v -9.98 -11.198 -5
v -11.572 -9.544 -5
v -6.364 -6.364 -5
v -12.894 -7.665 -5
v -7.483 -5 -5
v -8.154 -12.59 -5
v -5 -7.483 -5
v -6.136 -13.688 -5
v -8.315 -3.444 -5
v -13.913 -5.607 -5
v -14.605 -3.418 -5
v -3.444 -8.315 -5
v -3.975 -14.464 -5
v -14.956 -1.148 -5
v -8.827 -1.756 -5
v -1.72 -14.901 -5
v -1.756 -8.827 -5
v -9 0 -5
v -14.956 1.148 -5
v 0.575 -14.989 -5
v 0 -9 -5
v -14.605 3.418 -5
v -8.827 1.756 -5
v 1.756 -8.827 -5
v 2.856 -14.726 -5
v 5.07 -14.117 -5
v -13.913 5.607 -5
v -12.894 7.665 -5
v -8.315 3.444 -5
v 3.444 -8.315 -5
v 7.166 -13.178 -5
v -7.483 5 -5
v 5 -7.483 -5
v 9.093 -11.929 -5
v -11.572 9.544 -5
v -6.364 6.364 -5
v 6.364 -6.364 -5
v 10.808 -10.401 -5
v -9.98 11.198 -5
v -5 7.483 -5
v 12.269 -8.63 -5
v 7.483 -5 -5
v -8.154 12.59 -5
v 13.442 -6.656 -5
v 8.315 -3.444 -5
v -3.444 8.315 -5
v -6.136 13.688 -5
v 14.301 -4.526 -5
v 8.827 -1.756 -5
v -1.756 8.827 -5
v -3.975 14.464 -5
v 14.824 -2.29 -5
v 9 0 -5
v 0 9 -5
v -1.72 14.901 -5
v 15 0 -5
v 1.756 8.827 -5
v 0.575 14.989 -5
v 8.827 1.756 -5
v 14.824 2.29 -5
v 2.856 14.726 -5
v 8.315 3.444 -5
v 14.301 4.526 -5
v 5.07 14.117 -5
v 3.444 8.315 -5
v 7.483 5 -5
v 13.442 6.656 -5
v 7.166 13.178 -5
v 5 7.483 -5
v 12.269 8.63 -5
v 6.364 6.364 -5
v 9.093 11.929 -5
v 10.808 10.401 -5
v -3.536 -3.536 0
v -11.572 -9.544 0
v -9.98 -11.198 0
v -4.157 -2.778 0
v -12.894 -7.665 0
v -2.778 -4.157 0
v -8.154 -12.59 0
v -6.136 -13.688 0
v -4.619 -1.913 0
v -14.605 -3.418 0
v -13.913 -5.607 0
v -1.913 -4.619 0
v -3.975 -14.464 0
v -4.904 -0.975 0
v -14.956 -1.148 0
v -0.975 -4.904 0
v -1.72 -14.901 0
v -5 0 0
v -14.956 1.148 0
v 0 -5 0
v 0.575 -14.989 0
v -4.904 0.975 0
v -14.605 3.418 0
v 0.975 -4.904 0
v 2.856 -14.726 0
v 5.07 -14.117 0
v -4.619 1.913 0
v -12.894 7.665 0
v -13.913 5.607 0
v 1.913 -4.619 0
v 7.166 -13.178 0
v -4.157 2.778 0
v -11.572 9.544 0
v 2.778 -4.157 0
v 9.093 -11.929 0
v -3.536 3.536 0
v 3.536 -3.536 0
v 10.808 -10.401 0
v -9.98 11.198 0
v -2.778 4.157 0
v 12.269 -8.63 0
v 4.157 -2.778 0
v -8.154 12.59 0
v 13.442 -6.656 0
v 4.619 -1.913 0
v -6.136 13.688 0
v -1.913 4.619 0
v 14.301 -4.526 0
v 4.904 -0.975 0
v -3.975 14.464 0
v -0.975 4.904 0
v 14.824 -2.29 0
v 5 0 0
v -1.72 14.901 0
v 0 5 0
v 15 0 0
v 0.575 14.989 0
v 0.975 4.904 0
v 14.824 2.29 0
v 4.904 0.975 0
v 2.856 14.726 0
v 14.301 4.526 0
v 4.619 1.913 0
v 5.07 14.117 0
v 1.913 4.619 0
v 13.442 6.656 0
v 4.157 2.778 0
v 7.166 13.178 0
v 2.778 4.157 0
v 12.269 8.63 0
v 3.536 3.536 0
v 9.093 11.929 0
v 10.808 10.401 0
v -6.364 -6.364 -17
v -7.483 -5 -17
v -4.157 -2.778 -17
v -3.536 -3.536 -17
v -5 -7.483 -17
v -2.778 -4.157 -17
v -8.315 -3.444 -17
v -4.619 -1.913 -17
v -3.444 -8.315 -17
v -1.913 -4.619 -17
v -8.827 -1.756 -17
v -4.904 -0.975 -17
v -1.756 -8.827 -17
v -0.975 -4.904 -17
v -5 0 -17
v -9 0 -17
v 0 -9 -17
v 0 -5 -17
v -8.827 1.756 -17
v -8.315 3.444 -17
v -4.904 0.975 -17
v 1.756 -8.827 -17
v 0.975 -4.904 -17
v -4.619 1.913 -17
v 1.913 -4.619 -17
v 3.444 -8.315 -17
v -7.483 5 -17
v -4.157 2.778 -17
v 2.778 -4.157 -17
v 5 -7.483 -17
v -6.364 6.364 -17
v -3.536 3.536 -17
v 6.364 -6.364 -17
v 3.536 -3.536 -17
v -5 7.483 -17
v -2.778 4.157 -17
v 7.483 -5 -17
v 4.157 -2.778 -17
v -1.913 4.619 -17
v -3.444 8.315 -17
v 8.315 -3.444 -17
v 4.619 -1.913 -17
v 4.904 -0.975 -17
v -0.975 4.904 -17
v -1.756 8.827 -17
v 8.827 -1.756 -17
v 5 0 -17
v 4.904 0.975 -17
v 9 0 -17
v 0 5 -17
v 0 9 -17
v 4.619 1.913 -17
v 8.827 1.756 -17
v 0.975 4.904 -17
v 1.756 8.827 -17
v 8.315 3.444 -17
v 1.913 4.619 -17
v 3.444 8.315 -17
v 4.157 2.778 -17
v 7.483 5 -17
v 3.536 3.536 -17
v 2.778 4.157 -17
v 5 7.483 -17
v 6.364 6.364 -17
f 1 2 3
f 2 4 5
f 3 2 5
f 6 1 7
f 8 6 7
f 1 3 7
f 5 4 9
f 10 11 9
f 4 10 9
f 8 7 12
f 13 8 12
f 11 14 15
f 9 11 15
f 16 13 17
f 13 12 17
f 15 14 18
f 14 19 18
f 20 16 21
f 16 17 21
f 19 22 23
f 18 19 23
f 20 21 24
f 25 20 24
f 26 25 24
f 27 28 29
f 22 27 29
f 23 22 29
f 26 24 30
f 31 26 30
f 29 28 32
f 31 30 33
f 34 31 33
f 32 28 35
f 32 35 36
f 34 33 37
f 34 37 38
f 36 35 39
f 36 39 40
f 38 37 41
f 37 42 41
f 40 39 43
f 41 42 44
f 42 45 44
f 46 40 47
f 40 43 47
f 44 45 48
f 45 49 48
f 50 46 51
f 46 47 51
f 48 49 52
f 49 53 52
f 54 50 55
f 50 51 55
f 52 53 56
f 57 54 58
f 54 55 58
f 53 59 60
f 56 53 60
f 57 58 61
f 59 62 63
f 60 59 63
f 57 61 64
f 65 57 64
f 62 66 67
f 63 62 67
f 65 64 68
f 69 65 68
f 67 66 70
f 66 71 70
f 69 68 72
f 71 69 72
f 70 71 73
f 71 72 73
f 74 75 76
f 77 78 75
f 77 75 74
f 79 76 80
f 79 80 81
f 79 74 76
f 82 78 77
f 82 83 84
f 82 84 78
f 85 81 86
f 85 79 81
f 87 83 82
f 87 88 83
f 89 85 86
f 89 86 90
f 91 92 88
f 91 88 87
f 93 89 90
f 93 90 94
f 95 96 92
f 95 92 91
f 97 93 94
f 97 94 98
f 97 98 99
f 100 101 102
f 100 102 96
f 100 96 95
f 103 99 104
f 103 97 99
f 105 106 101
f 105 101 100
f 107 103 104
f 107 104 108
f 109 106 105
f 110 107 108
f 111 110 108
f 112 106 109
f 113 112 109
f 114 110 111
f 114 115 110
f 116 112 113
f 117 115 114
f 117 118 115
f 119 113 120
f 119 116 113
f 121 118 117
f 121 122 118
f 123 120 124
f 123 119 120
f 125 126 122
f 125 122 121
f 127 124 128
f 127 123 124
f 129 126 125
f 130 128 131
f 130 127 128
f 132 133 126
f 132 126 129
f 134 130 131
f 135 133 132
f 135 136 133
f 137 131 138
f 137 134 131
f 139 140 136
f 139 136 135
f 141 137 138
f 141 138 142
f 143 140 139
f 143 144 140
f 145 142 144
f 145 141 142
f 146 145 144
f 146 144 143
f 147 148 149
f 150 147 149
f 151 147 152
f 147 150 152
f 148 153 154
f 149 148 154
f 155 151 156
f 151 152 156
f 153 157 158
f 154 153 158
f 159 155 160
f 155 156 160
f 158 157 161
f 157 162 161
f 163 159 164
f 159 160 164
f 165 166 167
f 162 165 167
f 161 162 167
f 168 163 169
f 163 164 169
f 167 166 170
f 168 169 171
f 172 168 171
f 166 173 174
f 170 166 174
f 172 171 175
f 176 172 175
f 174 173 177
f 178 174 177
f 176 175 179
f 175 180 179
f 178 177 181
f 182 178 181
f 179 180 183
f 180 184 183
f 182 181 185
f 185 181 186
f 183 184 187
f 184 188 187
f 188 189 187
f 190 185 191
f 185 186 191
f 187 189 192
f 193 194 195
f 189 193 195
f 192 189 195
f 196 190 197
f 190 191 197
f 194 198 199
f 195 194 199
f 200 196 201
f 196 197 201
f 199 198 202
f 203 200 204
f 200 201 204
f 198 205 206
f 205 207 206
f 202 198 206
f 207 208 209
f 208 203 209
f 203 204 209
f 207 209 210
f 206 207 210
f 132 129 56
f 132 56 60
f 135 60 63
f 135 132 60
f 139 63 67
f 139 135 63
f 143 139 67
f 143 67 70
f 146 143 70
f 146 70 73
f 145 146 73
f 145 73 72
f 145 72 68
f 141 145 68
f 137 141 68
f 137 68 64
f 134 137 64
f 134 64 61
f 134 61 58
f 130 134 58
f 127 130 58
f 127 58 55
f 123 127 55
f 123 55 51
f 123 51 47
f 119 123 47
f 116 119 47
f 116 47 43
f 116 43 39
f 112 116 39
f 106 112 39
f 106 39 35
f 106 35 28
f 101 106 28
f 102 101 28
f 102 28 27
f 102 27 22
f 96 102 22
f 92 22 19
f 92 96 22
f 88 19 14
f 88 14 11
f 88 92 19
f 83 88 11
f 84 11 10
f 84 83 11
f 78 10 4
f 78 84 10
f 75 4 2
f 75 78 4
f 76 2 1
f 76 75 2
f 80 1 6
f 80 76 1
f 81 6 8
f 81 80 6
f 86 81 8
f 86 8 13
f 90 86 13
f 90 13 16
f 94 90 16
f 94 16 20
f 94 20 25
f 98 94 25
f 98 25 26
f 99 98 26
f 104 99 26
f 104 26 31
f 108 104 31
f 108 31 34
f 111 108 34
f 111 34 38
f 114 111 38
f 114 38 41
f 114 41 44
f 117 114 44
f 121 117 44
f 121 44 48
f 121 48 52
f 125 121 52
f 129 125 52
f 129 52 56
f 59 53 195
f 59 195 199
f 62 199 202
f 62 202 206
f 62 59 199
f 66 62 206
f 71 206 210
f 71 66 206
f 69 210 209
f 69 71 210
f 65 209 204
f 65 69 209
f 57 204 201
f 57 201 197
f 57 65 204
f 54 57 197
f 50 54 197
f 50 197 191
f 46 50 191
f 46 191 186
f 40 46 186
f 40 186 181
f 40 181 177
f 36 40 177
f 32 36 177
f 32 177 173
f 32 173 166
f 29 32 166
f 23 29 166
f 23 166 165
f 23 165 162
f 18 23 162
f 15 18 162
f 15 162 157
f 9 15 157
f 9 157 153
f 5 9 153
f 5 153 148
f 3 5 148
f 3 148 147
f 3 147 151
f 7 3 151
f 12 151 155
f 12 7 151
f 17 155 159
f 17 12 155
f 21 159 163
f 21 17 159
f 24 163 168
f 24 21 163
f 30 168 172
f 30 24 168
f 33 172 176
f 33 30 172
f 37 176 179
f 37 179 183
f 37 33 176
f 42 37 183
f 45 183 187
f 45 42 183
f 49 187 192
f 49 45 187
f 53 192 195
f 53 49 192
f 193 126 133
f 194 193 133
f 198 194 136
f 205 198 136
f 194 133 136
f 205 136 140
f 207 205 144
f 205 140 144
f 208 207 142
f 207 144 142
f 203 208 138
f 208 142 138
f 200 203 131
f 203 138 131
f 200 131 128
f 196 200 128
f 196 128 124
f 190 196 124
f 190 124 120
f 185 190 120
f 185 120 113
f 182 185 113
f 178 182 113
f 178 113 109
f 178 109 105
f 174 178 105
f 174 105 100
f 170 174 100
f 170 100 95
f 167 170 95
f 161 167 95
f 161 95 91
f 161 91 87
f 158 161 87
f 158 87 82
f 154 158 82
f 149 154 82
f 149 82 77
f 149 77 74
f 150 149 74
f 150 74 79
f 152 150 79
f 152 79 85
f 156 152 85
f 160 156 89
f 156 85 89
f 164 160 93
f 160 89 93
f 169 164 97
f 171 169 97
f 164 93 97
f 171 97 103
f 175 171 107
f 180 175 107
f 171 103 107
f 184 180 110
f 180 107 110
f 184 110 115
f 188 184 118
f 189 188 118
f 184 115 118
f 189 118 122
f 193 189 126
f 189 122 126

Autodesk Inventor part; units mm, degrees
ref_plane "YZ Plane" through (0, 0, 0) normal (1, 0, 0) x (0, 1, 0)
ref_plane "XZ Plane" through (0, 0, 0) normal (0, 1, 0) x (-1, 0, 0)
ref_plane "XY Plane" through (0, 0, 0) normal (0, 0, 1) x (1, 0, 0)
sketch "Sketch2" plane through (0, 0, 0) normal (0, 0, 1) x (1, 0, 0)
  circle A0 centre (0, 0) radius 15
  dimension "d0" = 30
extrude "Extrusion1" add sketch "Sketch2" against normal blind 5
sketch "Sketch3" plane through (0, 0, 0) normal (0, 0, 1) x (1, 0, 0)
  circle A0 centre (0, 0) radius 9
  dimension "d3" = 18
extrude "Extrusion2" add sketch "Sketch3" against normal blind 17
sketch "Sketch4" plane through (0, 0, 0) normal (0, 0, 1) x (1, 0, 0)
  circle A0 centre (0, 0) radius 5
  dimension "d6" = 10
extrude "Extrusion3" cut sketch "Sketch4" against normal blind 17
equation "\"BendRadius\" = Thickness"
equation "\"BendReliefWidth\" = Thickness"
equation "\"BendReliefDepth\" = 0.5 * Thickness"
equation "\"CornerReliefSize\" = 4 * Thickness"
equation "\"MinimumRemnant\" = 2 * Thickness"
equation "\"TransitionRadius\" = BendRadius"
equation "\"JacobiRadiusSize\" = BendRadius"
equation "\"GapSize\" = Thickness"
equation "\"Thickness\" = 3.048"
properties part number "Bushing_beam_stempel_long"
